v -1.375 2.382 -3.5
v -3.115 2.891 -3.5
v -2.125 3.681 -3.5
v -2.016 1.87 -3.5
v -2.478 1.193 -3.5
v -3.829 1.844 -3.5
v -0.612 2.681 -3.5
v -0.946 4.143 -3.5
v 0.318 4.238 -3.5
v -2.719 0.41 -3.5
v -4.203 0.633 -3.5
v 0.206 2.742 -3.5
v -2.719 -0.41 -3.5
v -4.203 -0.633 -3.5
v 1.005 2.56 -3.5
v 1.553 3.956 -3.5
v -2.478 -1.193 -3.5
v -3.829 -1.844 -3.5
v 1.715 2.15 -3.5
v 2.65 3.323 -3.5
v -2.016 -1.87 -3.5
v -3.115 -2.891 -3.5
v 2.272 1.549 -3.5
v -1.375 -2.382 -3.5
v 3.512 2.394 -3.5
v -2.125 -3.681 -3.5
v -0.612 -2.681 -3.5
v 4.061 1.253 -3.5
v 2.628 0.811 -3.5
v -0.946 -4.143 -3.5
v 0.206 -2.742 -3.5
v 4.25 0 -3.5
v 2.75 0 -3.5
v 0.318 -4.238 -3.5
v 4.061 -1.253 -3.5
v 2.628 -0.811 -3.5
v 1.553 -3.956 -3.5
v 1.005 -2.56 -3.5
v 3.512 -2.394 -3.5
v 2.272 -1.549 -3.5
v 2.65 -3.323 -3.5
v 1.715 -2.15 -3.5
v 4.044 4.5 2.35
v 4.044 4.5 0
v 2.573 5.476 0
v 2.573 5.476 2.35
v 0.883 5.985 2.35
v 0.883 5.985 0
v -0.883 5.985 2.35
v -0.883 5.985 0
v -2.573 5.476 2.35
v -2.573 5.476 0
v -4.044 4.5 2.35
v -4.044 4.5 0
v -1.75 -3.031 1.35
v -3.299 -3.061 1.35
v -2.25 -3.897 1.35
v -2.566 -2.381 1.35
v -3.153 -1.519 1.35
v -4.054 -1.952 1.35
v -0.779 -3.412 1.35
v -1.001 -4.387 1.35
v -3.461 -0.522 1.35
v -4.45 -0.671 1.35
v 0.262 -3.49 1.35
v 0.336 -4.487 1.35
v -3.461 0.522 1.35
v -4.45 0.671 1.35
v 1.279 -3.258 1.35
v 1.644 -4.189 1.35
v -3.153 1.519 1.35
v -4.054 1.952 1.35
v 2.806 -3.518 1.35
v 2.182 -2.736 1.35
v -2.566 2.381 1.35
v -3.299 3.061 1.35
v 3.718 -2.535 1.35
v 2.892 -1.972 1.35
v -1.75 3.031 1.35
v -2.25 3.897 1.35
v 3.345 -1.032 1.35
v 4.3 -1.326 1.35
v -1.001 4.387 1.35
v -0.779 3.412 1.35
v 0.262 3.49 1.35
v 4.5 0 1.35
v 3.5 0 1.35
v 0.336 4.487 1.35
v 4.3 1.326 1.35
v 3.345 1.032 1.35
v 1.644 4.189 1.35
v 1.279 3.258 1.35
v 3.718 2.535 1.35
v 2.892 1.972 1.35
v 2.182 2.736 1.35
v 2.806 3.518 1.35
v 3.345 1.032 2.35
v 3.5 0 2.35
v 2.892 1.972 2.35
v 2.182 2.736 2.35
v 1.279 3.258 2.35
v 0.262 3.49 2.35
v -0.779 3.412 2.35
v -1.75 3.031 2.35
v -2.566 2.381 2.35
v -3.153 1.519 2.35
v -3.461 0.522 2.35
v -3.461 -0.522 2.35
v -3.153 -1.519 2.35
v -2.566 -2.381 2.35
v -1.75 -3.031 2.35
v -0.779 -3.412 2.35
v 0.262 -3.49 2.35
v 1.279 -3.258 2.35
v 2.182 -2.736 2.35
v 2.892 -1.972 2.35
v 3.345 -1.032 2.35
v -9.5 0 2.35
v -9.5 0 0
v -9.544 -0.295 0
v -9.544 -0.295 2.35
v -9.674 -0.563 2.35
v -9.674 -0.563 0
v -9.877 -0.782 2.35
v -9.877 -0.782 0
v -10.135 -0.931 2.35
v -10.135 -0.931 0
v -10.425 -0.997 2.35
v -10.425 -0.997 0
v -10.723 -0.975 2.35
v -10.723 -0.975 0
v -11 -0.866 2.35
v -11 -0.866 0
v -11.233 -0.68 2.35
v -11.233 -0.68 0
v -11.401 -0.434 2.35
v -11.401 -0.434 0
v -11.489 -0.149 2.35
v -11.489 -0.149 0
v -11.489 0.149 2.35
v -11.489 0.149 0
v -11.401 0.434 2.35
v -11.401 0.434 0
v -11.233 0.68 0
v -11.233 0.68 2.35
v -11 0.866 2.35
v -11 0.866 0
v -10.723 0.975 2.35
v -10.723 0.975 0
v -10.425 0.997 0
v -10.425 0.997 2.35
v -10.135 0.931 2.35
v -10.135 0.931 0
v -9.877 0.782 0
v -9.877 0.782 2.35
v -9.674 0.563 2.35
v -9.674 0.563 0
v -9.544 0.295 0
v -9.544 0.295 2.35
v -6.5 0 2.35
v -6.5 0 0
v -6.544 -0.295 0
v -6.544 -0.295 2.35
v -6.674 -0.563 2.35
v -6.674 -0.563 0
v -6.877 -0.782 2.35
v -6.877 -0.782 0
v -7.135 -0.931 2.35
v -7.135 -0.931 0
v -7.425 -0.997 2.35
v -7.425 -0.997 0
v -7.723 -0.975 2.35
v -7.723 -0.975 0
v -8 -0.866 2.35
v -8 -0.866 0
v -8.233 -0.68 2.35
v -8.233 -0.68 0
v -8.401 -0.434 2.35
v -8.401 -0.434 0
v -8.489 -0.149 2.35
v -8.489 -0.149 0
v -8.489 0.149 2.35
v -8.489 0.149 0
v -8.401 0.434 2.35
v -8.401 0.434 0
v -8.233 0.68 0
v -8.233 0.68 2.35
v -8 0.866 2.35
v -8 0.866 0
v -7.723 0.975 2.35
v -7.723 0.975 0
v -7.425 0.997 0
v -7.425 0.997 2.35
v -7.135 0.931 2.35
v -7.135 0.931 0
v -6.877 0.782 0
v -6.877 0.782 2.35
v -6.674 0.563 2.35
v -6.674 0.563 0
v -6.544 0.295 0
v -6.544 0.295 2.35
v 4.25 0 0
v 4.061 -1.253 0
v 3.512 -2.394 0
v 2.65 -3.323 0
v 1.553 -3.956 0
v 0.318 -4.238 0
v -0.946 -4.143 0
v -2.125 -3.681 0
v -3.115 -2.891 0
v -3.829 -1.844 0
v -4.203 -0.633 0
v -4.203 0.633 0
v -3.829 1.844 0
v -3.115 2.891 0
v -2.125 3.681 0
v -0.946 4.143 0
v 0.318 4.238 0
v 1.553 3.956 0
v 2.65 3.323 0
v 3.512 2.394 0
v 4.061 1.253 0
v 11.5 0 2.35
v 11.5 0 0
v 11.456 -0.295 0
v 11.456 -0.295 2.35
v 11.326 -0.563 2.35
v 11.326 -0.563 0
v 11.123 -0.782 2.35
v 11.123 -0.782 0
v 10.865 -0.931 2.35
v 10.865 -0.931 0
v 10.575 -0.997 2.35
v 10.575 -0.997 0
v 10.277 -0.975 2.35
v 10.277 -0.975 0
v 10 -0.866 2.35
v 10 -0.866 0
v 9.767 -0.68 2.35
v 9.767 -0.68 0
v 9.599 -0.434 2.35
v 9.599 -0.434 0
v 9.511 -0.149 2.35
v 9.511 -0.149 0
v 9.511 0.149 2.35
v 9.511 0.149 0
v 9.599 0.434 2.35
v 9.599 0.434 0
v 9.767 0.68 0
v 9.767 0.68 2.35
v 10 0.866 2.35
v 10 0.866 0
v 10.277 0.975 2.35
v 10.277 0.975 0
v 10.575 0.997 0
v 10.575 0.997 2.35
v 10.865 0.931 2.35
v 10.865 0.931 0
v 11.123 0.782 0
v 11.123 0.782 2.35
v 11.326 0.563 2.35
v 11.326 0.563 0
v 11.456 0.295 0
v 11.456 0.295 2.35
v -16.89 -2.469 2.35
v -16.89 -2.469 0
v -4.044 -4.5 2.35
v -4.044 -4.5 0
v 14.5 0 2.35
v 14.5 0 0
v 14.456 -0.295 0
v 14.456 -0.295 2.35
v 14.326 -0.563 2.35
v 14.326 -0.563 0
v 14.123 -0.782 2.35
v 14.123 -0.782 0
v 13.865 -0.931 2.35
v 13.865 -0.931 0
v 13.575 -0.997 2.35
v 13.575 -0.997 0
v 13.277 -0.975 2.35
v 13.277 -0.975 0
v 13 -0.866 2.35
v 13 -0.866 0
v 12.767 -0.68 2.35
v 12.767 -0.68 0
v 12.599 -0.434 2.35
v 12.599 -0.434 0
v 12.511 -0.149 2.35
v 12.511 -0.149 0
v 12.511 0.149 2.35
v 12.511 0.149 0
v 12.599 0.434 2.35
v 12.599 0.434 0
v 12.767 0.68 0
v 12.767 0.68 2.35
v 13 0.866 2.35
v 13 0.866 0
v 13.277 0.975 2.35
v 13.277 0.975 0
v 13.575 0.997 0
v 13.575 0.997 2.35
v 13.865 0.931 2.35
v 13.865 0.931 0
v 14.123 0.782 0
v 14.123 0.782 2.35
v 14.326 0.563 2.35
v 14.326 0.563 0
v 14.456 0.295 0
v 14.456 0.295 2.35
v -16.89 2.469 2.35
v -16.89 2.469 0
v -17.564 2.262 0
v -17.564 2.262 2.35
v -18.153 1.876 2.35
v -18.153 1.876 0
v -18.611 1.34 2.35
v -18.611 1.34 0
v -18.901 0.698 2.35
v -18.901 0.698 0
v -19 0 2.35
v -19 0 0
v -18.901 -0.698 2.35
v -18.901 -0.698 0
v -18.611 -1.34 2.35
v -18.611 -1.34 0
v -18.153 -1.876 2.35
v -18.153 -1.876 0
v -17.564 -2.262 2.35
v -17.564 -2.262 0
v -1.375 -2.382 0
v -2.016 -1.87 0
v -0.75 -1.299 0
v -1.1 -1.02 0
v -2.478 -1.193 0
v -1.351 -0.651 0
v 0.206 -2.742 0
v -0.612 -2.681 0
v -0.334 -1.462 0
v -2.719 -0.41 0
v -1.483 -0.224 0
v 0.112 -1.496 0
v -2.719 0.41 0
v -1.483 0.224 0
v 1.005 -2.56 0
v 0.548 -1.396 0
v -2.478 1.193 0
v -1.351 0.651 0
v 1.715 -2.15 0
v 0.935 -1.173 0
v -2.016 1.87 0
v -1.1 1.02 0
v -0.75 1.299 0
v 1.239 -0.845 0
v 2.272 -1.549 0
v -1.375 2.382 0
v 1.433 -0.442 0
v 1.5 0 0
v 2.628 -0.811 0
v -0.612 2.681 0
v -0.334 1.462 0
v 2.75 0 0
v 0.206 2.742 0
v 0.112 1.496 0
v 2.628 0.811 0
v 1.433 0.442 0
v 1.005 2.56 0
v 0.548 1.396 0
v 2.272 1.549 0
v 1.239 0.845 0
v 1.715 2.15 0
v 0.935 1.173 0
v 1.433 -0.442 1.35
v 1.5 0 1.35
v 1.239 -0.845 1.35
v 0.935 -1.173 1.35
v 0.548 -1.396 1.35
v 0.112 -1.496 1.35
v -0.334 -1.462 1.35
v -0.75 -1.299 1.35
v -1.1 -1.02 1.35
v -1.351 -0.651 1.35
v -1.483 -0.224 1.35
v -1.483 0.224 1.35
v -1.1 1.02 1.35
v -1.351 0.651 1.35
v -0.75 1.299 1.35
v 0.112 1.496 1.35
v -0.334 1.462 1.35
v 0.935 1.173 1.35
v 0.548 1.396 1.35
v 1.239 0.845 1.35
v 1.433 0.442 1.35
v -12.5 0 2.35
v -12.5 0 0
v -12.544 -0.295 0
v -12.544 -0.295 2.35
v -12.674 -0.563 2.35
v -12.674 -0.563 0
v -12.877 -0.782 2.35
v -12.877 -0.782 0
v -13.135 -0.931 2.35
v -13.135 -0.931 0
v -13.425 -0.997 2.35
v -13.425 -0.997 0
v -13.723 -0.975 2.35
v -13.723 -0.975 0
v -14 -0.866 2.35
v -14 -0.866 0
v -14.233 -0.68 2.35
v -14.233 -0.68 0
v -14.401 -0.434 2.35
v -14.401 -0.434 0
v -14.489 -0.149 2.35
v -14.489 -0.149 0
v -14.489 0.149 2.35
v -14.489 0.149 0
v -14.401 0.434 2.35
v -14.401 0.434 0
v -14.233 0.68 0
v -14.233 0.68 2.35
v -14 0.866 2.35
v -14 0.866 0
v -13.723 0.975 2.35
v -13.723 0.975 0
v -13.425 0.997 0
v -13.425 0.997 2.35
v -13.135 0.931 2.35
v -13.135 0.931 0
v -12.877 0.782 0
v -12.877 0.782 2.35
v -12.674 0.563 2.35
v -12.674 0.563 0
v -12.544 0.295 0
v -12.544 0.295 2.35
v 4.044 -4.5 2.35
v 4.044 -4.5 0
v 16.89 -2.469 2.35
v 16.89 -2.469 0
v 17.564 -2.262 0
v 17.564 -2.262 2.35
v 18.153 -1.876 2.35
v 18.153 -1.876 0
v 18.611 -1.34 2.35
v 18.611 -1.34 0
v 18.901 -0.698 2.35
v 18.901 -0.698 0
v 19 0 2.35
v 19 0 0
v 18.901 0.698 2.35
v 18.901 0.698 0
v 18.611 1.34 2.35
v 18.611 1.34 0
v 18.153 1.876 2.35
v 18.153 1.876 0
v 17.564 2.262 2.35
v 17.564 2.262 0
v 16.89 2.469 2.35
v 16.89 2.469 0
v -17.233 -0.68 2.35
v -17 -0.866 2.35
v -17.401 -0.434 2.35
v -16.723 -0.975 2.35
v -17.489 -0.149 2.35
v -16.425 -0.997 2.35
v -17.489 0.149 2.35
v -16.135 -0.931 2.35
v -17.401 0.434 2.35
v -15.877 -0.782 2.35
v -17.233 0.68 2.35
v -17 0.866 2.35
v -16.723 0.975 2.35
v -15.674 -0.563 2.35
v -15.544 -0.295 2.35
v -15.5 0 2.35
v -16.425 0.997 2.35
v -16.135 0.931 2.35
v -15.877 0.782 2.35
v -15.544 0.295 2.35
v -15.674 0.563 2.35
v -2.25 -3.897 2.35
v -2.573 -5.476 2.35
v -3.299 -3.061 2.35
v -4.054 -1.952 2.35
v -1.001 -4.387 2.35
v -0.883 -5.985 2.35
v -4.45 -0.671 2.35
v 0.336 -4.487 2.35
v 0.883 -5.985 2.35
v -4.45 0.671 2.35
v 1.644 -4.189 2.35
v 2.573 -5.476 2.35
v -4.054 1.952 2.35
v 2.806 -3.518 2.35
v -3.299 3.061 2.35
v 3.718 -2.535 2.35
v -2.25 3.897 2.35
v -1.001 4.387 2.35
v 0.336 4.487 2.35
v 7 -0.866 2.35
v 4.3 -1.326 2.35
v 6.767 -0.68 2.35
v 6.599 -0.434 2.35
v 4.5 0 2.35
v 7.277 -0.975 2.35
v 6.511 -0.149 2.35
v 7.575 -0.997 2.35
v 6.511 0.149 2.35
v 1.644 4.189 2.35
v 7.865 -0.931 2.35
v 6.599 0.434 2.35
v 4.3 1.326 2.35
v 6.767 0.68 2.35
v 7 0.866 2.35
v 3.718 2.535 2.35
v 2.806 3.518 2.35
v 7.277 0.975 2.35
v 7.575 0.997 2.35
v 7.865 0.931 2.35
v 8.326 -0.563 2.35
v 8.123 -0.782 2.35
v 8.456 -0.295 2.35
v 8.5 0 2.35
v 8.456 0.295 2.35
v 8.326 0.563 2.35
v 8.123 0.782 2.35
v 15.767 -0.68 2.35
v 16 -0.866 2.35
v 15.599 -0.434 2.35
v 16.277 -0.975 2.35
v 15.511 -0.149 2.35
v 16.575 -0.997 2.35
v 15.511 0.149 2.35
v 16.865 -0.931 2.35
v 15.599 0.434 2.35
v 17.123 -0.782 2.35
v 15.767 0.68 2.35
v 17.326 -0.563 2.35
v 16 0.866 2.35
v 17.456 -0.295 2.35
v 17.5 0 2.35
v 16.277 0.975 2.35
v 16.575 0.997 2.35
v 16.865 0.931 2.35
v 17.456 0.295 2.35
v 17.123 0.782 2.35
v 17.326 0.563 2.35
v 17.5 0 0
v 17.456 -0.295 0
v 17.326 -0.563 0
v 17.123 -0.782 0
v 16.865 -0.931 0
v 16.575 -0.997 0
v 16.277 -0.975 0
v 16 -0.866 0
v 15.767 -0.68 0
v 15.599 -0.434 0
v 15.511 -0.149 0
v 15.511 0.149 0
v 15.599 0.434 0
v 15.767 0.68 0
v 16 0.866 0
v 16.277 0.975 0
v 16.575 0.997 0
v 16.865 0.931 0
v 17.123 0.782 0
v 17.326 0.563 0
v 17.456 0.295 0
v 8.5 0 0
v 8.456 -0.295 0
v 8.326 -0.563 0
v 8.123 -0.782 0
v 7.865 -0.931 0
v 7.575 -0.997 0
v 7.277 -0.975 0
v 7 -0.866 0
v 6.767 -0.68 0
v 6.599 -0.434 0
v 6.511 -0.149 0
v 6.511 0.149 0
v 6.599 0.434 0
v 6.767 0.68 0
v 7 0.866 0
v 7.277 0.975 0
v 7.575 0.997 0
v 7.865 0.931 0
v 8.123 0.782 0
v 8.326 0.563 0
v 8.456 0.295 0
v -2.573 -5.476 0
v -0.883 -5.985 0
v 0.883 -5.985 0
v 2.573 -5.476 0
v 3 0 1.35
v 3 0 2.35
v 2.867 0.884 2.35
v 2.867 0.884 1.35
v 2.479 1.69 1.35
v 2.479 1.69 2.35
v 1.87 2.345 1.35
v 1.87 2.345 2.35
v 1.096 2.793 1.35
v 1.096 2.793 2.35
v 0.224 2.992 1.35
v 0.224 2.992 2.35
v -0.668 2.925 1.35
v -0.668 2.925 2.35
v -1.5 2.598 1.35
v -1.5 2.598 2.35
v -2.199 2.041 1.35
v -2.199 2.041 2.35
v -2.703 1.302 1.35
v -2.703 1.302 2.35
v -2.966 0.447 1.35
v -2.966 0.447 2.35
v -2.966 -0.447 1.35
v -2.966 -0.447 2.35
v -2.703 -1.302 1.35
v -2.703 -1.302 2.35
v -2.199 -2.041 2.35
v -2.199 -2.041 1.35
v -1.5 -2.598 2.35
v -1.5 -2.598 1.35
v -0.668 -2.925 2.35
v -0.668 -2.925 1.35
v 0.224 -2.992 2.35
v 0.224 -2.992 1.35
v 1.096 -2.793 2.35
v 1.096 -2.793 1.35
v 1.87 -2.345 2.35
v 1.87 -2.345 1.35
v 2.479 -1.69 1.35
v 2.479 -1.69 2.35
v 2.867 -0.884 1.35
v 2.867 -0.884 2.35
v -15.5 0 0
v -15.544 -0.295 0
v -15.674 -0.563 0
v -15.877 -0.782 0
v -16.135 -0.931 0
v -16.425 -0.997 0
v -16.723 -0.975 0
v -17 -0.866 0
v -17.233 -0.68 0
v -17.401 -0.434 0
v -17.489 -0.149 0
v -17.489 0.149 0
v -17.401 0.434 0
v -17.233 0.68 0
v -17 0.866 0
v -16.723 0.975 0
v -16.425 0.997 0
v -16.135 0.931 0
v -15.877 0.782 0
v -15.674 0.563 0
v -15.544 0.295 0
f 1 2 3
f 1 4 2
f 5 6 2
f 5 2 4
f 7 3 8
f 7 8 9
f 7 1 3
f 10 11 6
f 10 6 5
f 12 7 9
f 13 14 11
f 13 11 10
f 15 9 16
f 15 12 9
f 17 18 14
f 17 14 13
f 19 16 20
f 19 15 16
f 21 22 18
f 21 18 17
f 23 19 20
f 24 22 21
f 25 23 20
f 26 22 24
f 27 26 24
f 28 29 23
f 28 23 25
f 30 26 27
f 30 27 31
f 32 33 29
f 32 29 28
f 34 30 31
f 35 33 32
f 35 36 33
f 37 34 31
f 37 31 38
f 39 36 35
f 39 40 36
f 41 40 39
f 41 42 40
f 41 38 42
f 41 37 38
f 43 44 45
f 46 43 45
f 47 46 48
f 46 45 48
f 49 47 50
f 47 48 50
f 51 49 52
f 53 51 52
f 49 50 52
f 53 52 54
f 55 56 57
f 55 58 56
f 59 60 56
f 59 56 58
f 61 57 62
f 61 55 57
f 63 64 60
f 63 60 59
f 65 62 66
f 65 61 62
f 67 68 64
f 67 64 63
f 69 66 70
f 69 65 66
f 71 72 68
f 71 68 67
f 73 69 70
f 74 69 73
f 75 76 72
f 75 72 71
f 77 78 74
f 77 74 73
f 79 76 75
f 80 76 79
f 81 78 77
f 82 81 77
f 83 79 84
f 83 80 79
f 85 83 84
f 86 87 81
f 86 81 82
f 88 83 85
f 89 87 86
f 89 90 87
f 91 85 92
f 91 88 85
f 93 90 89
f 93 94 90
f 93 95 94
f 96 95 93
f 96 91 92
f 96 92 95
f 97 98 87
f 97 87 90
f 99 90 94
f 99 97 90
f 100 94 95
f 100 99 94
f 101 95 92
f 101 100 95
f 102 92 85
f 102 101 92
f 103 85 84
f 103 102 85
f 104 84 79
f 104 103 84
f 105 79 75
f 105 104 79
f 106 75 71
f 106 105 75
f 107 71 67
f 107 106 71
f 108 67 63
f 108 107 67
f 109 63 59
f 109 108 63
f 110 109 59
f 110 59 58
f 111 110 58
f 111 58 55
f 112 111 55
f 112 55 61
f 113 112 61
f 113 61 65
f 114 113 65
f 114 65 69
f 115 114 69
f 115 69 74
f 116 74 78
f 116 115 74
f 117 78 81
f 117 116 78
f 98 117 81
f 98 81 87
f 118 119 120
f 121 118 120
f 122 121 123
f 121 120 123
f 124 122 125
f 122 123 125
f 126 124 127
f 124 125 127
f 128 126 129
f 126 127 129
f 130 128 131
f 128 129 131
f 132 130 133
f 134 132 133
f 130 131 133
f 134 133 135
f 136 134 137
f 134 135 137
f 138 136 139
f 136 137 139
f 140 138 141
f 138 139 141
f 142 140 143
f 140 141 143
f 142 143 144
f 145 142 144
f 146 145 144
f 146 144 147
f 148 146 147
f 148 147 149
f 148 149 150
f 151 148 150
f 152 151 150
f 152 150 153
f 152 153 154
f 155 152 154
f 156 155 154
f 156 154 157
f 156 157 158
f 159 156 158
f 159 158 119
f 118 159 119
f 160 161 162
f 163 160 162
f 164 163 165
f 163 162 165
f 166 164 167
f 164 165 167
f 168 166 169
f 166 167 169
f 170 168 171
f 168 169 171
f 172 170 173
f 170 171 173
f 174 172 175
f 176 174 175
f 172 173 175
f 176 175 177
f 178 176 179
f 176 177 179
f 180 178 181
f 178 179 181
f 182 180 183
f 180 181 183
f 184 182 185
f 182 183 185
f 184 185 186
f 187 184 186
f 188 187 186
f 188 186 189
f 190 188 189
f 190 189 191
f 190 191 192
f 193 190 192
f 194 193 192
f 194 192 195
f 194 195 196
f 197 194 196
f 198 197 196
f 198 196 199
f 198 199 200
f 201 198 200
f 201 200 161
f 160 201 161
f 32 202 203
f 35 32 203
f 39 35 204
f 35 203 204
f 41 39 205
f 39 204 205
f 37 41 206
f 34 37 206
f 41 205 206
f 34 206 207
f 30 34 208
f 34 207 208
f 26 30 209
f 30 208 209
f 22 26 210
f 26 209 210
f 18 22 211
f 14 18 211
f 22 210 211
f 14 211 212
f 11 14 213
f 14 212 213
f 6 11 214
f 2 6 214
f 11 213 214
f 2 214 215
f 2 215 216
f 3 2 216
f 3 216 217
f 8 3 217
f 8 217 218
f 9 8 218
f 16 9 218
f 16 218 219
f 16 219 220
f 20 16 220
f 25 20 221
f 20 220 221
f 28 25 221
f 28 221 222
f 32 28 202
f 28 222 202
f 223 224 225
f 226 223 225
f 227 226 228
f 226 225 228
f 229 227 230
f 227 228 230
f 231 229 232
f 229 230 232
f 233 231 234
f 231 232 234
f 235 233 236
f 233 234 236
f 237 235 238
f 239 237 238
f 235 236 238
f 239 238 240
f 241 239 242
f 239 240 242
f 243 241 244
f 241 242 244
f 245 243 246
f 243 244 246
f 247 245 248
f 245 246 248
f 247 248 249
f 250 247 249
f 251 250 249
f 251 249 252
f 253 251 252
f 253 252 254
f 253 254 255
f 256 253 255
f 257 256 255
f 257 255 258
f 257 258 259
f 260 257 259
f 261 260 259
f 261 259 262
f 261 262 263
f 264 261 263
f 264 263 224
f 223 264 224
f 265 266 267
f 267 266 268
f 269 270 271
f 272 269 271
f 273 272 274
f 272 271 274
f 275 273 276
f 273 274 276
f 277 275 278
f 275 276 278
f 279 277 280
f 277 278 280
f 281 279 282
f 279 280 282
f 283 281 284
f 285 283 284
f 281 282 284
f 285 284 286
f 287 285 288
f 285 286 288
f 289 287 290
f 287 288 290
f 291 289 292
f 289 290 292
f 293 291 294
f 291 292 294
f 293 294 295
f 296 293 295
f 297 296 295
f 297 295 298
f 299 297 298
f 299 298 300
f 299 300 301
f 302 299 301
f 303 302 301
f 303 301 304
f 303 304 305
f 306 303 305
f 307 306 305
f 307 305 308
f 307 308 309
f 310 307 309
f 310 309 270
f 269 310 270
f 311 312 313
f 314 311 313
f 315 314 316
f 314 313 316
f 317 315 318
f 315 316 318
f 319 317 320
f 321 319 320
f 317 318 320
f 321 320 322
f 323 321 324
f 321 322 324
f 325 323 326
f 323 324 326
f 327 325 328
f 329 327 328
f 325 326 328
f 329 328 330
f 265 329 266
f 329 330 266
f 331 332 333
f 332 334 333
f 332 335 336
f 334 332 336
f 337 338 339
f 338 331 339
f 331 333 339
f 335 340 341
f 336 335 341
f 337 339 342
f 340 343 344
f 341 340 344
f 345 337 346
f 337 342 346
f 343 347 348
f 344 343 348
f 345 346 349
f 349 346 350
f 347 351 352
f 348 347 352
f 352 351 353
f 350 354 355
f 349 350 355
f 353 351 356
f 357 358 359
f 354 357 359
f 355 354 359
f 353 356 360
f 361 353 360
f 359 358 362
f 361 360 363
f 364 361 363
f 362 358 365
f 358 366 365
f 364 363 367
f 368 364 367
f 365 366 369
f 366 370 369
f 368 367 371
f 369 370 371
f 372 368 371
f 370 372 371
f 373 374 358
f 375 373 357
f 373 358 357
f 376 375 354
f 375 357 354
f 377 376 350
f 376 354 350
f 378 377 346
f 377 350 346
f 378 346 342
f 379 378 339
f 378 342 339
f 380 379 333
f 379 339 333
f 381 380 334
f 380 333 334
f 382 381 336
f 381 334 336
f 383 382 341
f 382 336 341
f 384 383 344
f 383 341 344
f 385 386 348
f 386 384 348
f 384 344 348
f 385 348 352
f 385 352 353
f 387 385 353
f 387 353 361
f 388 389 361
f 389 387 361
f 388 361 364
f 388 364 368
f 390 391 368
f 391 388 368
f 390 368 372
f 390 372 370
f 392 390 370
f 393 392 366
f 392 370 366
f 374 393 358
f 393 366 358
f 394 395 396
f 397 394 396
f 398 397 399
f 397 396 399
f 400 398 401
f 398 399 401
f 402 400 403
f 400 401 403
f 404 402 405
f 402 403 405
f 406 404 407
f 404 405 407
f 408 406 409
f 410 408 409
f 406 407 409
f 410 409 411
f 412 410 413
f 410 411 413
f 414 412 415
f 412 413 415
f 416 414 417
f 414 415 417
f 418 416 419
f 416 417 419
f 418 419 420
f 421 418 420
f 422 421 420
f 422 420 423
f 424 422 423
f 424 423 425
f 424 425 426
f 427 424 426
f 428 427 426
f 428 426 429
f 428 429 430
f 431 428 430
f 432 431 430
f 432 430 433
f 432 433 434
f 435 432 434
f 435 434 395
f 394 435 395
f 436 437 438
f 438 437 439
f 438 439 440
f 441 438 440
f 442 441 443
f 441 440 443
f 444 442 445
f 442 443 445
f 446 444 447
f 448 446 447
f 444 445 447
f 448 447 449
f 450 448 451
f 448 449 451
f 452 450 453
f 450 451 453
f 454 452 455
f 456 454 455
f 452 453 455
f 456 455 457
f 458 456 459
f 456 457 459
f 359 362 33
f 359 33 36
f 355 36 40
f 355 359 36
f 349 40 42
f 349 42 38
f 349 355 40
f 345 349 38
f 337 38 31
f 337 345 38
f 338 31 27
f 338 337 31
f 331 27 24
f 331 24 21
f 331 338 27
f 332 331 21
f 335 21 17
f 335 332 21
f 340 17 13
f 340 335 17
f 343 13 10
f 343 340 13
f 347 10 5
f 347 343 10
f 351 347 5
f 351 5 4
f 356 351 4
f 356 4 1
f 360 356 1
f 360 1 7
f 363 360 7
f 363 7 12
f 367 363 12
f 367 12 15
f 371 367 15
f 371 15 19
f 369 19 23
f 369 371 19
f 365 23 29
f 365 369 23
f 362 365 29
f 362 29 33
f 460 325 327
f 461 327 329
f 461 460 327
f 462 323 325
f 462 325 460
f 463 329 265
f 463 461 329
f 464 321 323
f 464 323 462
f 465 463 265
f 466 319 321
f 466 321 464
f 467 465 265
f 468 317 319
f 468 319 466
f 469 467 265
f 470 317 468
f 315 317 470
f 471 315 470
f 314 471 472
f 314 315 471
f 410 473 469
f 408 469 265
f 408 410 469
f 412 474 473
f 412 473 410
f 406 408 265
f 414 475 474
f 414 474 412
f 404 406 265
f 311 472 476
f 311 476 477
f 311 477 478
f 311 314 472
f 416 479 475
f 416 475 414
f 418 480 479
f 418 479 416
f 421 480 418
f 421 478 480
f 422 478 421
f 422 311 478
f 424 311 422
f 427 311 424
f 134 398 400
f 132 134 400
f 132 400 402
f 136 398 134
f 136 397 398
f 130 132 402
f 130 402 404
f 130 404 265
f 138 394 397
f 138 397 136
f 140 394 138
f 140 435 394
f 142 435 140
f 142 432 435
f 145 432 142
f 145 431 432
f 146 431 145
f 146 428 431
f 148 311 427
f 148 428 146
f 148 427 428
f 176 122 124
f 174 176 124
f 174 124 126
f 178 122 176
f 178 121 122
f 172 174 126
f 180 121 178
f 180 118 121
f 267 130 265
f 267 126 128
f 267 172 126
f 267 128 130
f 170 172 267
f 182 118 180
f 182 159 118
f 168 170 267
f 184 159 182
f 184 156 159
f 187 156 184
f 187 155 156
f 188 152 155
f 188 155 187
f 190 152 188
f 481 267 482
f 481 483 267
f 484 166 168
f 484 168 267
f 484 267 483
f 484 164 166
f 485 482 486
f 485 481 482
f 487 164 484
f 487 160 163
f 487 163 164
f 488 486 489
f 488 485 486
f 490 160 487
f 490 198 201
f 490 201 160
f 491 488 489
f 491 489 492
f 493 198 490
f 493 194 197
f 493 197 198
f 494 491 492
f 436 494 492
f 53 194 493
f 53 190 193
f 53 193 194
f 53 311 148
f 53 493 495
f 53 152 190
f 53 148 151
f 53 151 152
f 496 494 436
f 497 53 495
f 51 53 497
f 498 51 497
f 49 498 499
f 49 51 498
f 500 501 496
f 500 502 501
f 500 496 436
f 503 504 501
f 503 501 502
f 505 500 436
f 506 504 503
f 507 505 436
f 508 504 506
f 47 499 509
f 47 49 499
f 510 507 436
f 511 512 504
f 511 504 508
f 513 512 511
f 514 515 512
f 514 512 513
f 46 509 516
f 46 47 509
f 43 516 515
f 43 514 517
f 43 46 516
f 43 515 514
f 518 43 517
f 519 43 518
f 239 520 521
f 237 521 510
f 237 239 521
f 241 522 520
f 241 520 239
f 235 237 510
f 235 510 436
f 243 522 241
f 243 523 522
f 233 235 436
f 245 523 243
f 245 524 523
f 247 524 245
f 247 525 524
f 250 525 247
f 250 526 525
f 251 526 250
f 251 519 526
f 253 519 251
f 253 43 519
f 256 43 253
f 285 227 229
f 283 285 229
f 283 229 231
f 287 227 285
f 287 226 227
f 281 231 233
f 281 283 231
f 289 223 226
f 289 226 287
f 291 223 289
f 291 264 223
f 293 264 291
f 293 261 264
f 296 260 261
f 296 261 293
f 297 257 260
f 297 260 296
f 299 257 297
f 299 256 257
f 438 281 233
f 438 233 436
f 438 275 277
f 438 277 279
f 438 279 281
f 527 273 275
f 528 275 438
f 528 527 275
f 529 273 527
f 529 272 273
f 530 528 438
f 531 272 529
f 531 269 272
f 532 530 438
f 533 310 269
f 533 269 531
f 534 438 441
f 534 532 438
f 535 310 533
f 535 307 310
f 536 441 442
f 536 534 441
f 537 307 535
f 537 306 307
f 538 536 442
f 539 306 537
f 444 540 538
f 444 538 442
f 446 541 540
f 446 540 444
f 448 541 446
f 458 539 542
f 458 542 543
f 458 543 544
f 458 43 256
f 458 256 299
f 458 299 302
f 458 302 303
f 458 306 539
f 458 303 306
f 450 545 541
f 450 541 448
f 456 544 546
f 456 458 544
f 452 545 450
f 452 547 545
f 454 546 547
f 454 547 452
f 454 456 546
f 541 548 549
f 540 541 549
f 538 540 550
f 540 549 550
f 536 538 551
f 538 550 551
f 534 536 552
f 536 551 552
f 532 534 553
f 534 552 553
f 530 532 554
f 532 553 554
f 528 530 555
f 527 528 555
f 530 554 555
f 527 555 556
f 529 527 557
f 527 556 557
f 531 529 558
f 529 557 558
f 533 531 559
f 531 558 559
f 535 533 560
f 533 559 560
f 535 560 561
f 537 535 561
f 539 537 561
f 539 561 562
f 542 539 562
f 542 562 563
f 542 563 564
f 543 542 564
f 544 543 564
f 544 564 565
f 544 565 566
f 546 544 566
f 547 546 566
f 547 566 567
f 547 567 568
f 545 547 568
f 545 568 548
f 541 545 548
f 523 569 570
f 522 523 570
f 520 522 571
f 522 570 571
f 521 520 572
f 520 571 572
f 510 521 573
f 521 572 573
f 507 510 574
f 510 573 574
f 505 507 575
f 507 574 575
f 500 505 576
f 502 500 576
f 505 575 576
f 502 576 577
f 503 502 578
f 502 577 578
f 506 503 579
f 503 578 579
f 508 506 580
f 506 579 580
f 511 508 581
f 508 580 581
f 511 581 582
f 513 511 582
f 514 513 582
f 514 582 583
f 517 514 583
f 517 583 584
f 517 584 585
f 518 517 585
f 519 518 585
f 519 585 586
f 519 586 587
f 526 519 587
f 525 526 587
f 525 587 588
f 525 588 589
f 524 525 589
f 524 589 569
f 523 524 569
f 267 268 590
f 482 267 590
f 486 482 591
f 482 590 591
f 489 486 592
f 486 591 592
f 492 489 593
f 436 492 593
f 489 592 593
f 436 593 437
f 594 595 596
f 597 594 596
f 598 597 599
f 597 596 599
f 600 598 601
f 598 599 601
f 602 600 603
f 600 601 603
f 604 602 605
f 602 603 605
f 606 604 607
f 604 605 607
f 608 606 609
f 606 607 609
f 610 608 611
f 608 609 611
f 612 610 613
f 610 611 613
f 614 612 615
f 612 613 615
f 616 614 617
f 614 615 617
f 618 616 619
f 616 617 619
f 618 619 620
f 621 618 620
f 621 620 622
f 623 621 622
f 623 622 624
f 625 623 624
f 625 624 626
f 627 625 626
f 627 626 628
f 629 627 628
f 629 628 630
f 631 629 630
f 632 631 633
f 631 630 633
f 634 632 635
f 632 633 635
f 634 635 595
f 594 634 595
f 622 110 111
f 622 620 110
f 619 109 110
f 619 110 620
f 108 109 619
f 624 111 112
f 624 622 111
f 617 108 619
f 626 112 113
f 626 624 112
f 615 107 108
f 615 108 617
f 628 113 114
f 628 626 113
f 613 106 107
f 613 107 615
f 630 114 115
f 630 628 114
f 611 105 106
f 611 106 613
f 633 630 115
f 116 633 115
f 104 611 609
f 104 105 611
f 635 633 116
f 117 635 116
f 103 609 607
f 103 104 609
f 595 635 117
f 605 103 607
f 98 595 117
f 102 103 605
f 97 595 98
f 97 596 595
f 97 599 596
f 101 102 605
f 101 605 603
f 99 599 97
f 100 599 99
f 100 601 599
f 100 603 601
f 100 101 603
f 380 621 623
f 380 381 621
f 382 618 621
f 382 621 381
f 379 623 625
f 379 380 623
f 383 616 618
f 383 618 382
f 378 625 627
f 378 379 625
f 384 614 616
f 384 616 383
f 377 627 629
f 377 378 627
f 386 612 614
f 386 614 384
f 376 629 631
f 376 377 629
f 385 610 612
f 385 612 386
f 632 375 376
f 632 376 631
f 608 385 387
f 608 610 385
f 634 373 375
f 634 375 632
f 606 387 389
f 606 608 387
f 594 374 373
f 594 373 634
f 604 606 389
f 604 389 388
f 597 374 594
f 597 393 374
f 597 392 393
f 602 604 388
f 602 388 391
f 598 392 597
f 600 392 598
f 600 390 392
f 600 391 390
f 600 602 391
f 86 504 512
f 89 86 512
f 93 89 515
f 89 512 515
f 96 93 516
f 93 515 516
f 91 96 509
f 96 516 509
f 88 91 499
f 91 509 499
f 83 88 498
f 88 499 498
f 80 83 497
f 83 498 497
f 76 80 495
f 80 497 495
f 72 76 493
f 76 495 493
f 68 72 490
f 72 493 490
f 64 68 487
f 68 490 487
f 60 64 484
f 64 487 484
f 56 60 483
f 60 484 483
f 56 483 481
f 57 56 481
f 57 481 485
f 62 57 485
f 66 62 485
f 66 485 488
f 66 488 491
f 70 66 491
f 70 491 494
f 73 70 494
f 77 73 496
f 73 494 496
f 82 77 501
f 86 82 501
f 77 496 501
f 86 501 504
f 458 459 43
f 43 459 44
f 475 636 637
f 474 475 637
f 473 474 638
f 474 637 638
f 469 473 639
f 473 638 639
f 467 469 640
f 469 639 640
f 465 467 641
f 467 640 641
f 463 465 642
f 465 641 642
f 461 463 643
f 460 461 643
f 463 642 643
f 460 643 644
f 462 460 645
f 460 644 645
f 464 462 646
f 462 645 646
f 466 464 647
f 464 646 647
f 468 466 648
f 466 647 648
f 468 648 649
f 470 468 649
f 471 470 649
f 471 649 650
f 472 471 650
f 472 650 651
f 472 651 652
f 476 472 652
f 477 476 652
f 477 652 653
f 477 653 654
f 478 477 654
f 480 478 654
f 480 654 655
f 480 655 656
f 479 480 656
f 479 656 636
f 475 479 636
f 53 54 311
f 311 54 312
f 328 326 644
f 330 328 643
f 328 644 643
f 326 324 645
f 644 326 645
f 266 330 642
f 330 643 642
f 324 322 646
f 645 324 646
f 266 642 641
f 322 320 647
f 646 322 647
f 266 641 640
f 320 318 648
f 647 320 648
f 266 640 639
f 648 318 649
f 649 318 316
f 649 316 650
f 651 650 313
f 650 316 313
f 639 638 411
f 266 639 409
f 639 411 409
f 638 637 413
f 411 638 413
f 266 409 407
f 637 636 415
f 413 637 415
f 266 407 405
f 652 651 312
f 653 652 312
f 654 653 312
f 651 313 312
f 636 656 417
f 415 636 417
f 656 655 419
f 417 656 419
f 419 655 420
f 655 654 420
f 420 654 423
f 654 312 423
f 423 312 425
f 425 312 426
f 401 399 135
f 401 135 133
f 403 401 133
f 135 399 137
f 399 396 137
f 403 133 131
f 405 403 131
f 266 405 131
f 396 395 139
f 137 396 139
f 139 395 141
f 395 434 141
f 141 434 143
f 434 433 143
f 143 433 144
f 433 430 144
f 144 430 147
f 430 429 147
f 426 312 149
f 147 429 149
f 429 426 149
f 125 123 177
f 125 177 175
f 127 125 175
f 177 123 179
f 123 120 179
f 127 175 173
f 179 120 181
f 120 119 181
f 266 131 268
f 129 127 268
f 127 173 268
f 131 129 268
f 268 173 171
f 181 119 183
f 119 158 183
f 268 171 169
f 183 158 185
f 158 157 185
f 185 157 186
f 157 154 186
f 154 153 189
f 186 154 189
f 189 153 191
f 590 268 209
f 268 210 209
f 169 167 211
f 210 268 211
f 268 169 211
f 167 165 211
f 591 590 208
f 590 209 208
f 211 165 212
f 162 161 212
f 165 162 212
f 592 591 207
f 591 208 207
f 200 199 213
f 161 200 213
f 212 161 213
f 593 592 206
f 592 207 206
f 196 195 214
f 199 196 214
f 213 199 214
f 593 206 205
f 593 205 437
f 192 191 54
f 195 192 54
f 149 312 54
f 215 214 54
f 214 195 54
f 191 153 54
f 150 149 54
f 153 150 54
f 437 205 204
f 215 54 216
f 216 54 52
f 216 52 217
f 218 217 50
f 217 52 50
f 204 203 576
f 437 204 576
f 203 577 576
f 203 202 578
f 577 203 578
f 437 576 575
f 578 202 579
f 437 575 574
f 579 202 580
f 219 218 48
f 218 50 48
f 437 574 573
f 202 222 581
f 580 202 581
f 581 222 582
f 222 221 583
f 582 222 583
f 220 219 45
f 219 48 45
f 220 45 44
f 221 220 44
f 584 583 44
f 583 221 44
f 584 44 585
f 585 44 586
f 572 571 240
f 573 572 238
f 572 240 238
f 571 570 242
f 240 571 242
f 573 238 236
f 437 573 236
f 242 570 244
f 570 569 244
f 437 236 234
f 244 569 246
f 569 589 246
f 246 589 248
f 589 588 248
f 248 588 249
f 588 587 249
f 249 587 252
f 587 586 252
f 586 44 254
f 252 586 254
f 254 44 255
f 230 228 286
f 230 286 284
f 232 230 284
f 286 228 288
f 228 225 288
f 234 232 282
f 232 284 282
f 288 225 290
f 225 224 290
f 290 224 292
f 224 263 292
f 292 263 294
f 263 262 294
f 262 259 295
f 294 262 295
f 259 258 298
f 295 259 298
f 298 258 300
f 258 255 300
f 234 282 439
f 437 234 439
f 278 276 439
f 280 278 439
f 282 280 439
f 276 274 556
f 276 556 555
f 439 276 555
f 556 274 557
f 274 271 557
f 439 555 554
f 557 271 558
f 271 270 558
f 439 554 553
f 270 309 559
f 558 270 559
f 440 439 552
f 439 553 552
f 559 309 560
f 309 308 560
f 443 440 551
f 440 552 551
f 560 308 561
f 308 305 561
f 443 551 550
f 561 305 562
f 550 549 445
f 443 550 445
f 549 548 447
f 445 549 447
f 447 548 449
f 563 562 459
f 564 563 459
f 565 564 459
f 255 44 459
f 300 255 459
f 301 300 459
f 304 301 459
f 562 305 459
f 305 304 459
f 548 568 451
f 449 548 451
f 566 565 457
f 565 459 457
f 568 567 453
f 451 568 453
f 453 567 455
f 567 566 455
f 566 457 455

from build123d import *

# Parameters (mm, degrees)
F1_DEPTH = 2.35
F2_R     = 4.25
F2_R_2   = 2.75
F3_DEPTH = 3.5
F4_R     = 1.5
F4_R_2   = 1
F5_DEPTH = 25
F6_R     = 4.5
F6_R_2   = 3.5
F6_R_3   = 3
F6_R_4   = 1.5
F7_DEPTH = 1


with BuildPart() as f1:
    # F0 (on Top) → F1 (new body)
    with BuildSketch(Plane.XY):
        with BuildLine():
            Line((-16.890331, -2.46934), (-4.043822, -4.5))
            ThreePointArc((-4.043822, -4.5), (0, -6.05), (4.043822, -4.5))
            Line((4.043822, -4.5), (16.890331, -2.46934))
            ThreePointArc((16.890331, -2.46934), (19, 0), (16.890331, 2.46934))
            Line((16.890331, 2.46934), (4.043822, 4.5))
            ThreePointArc((4.043822, 4.5), (0, 6.05), (-4.043822, 4.5))
            Line((-4.043822, 4.5), (-16.890331, 2.46934))
            ThreePointArc((-16.890331, 2.46934), (-19, 0), (-16.890331, -2.46934))
        make_face()
    extrude(amount=F1_DEPTH)

    # F2 (on face) → F3 (join)
    with BuildSketch(Plane(origin=(0, 0, 0), x_dir=(1, 0, 0), z_dir=(0, 0, -1))):
        Circle(F2_R)
        Circle(F2_R_2, mode=Mode.SUBTRACT)
    extrude(amount=F3_DEPTH)

    # F4 (on face) → F5 (cut)
    with BuildSketch(Plane(origin=(0, 0, 0), x_dir=(1, 0, 0), z_dir=(0, 0, -1))):
        Circle(F4_R)
        with Locations((-7.5, 0)):
            Circle(F4_R_2)
        with Locations((-10.5, 0)):
            Circle(F4_R_2)
        with Locations((-13.5, 0)):
            Circle(F4_R_2)
        with Locations((-16.5, 0)):
            Circle(F4_R_2)
        with Locations((7.5, 0)):
            Circle(F4_R_2)
        with Locations((10.5, 0)):
            Circle(F4_R_2)
        with Locations((13.5, 0)):
            Circle(F4_R_2)
        with Locations((16.5, 0)):
            Circle(F4_R_2)
    extrude(amount=-F5_DEPTH, mode=Mode.SUBTRACT)

    # F6 (on face) → F7 (cut)
    with BuildSketch(Plane.XY.offset(2.35)):
        Circle(F6_R)
        Circle(F6_R_2, mode=Mode.SUBTRACT)
        Circle(F6_R_3)
        Circle(F6_R_4, mode=Mode.SUBTRACT)
    extrude(amount=-F7_DEPTH, mode=Mode.SUBTRACT)


solid = f1.part
